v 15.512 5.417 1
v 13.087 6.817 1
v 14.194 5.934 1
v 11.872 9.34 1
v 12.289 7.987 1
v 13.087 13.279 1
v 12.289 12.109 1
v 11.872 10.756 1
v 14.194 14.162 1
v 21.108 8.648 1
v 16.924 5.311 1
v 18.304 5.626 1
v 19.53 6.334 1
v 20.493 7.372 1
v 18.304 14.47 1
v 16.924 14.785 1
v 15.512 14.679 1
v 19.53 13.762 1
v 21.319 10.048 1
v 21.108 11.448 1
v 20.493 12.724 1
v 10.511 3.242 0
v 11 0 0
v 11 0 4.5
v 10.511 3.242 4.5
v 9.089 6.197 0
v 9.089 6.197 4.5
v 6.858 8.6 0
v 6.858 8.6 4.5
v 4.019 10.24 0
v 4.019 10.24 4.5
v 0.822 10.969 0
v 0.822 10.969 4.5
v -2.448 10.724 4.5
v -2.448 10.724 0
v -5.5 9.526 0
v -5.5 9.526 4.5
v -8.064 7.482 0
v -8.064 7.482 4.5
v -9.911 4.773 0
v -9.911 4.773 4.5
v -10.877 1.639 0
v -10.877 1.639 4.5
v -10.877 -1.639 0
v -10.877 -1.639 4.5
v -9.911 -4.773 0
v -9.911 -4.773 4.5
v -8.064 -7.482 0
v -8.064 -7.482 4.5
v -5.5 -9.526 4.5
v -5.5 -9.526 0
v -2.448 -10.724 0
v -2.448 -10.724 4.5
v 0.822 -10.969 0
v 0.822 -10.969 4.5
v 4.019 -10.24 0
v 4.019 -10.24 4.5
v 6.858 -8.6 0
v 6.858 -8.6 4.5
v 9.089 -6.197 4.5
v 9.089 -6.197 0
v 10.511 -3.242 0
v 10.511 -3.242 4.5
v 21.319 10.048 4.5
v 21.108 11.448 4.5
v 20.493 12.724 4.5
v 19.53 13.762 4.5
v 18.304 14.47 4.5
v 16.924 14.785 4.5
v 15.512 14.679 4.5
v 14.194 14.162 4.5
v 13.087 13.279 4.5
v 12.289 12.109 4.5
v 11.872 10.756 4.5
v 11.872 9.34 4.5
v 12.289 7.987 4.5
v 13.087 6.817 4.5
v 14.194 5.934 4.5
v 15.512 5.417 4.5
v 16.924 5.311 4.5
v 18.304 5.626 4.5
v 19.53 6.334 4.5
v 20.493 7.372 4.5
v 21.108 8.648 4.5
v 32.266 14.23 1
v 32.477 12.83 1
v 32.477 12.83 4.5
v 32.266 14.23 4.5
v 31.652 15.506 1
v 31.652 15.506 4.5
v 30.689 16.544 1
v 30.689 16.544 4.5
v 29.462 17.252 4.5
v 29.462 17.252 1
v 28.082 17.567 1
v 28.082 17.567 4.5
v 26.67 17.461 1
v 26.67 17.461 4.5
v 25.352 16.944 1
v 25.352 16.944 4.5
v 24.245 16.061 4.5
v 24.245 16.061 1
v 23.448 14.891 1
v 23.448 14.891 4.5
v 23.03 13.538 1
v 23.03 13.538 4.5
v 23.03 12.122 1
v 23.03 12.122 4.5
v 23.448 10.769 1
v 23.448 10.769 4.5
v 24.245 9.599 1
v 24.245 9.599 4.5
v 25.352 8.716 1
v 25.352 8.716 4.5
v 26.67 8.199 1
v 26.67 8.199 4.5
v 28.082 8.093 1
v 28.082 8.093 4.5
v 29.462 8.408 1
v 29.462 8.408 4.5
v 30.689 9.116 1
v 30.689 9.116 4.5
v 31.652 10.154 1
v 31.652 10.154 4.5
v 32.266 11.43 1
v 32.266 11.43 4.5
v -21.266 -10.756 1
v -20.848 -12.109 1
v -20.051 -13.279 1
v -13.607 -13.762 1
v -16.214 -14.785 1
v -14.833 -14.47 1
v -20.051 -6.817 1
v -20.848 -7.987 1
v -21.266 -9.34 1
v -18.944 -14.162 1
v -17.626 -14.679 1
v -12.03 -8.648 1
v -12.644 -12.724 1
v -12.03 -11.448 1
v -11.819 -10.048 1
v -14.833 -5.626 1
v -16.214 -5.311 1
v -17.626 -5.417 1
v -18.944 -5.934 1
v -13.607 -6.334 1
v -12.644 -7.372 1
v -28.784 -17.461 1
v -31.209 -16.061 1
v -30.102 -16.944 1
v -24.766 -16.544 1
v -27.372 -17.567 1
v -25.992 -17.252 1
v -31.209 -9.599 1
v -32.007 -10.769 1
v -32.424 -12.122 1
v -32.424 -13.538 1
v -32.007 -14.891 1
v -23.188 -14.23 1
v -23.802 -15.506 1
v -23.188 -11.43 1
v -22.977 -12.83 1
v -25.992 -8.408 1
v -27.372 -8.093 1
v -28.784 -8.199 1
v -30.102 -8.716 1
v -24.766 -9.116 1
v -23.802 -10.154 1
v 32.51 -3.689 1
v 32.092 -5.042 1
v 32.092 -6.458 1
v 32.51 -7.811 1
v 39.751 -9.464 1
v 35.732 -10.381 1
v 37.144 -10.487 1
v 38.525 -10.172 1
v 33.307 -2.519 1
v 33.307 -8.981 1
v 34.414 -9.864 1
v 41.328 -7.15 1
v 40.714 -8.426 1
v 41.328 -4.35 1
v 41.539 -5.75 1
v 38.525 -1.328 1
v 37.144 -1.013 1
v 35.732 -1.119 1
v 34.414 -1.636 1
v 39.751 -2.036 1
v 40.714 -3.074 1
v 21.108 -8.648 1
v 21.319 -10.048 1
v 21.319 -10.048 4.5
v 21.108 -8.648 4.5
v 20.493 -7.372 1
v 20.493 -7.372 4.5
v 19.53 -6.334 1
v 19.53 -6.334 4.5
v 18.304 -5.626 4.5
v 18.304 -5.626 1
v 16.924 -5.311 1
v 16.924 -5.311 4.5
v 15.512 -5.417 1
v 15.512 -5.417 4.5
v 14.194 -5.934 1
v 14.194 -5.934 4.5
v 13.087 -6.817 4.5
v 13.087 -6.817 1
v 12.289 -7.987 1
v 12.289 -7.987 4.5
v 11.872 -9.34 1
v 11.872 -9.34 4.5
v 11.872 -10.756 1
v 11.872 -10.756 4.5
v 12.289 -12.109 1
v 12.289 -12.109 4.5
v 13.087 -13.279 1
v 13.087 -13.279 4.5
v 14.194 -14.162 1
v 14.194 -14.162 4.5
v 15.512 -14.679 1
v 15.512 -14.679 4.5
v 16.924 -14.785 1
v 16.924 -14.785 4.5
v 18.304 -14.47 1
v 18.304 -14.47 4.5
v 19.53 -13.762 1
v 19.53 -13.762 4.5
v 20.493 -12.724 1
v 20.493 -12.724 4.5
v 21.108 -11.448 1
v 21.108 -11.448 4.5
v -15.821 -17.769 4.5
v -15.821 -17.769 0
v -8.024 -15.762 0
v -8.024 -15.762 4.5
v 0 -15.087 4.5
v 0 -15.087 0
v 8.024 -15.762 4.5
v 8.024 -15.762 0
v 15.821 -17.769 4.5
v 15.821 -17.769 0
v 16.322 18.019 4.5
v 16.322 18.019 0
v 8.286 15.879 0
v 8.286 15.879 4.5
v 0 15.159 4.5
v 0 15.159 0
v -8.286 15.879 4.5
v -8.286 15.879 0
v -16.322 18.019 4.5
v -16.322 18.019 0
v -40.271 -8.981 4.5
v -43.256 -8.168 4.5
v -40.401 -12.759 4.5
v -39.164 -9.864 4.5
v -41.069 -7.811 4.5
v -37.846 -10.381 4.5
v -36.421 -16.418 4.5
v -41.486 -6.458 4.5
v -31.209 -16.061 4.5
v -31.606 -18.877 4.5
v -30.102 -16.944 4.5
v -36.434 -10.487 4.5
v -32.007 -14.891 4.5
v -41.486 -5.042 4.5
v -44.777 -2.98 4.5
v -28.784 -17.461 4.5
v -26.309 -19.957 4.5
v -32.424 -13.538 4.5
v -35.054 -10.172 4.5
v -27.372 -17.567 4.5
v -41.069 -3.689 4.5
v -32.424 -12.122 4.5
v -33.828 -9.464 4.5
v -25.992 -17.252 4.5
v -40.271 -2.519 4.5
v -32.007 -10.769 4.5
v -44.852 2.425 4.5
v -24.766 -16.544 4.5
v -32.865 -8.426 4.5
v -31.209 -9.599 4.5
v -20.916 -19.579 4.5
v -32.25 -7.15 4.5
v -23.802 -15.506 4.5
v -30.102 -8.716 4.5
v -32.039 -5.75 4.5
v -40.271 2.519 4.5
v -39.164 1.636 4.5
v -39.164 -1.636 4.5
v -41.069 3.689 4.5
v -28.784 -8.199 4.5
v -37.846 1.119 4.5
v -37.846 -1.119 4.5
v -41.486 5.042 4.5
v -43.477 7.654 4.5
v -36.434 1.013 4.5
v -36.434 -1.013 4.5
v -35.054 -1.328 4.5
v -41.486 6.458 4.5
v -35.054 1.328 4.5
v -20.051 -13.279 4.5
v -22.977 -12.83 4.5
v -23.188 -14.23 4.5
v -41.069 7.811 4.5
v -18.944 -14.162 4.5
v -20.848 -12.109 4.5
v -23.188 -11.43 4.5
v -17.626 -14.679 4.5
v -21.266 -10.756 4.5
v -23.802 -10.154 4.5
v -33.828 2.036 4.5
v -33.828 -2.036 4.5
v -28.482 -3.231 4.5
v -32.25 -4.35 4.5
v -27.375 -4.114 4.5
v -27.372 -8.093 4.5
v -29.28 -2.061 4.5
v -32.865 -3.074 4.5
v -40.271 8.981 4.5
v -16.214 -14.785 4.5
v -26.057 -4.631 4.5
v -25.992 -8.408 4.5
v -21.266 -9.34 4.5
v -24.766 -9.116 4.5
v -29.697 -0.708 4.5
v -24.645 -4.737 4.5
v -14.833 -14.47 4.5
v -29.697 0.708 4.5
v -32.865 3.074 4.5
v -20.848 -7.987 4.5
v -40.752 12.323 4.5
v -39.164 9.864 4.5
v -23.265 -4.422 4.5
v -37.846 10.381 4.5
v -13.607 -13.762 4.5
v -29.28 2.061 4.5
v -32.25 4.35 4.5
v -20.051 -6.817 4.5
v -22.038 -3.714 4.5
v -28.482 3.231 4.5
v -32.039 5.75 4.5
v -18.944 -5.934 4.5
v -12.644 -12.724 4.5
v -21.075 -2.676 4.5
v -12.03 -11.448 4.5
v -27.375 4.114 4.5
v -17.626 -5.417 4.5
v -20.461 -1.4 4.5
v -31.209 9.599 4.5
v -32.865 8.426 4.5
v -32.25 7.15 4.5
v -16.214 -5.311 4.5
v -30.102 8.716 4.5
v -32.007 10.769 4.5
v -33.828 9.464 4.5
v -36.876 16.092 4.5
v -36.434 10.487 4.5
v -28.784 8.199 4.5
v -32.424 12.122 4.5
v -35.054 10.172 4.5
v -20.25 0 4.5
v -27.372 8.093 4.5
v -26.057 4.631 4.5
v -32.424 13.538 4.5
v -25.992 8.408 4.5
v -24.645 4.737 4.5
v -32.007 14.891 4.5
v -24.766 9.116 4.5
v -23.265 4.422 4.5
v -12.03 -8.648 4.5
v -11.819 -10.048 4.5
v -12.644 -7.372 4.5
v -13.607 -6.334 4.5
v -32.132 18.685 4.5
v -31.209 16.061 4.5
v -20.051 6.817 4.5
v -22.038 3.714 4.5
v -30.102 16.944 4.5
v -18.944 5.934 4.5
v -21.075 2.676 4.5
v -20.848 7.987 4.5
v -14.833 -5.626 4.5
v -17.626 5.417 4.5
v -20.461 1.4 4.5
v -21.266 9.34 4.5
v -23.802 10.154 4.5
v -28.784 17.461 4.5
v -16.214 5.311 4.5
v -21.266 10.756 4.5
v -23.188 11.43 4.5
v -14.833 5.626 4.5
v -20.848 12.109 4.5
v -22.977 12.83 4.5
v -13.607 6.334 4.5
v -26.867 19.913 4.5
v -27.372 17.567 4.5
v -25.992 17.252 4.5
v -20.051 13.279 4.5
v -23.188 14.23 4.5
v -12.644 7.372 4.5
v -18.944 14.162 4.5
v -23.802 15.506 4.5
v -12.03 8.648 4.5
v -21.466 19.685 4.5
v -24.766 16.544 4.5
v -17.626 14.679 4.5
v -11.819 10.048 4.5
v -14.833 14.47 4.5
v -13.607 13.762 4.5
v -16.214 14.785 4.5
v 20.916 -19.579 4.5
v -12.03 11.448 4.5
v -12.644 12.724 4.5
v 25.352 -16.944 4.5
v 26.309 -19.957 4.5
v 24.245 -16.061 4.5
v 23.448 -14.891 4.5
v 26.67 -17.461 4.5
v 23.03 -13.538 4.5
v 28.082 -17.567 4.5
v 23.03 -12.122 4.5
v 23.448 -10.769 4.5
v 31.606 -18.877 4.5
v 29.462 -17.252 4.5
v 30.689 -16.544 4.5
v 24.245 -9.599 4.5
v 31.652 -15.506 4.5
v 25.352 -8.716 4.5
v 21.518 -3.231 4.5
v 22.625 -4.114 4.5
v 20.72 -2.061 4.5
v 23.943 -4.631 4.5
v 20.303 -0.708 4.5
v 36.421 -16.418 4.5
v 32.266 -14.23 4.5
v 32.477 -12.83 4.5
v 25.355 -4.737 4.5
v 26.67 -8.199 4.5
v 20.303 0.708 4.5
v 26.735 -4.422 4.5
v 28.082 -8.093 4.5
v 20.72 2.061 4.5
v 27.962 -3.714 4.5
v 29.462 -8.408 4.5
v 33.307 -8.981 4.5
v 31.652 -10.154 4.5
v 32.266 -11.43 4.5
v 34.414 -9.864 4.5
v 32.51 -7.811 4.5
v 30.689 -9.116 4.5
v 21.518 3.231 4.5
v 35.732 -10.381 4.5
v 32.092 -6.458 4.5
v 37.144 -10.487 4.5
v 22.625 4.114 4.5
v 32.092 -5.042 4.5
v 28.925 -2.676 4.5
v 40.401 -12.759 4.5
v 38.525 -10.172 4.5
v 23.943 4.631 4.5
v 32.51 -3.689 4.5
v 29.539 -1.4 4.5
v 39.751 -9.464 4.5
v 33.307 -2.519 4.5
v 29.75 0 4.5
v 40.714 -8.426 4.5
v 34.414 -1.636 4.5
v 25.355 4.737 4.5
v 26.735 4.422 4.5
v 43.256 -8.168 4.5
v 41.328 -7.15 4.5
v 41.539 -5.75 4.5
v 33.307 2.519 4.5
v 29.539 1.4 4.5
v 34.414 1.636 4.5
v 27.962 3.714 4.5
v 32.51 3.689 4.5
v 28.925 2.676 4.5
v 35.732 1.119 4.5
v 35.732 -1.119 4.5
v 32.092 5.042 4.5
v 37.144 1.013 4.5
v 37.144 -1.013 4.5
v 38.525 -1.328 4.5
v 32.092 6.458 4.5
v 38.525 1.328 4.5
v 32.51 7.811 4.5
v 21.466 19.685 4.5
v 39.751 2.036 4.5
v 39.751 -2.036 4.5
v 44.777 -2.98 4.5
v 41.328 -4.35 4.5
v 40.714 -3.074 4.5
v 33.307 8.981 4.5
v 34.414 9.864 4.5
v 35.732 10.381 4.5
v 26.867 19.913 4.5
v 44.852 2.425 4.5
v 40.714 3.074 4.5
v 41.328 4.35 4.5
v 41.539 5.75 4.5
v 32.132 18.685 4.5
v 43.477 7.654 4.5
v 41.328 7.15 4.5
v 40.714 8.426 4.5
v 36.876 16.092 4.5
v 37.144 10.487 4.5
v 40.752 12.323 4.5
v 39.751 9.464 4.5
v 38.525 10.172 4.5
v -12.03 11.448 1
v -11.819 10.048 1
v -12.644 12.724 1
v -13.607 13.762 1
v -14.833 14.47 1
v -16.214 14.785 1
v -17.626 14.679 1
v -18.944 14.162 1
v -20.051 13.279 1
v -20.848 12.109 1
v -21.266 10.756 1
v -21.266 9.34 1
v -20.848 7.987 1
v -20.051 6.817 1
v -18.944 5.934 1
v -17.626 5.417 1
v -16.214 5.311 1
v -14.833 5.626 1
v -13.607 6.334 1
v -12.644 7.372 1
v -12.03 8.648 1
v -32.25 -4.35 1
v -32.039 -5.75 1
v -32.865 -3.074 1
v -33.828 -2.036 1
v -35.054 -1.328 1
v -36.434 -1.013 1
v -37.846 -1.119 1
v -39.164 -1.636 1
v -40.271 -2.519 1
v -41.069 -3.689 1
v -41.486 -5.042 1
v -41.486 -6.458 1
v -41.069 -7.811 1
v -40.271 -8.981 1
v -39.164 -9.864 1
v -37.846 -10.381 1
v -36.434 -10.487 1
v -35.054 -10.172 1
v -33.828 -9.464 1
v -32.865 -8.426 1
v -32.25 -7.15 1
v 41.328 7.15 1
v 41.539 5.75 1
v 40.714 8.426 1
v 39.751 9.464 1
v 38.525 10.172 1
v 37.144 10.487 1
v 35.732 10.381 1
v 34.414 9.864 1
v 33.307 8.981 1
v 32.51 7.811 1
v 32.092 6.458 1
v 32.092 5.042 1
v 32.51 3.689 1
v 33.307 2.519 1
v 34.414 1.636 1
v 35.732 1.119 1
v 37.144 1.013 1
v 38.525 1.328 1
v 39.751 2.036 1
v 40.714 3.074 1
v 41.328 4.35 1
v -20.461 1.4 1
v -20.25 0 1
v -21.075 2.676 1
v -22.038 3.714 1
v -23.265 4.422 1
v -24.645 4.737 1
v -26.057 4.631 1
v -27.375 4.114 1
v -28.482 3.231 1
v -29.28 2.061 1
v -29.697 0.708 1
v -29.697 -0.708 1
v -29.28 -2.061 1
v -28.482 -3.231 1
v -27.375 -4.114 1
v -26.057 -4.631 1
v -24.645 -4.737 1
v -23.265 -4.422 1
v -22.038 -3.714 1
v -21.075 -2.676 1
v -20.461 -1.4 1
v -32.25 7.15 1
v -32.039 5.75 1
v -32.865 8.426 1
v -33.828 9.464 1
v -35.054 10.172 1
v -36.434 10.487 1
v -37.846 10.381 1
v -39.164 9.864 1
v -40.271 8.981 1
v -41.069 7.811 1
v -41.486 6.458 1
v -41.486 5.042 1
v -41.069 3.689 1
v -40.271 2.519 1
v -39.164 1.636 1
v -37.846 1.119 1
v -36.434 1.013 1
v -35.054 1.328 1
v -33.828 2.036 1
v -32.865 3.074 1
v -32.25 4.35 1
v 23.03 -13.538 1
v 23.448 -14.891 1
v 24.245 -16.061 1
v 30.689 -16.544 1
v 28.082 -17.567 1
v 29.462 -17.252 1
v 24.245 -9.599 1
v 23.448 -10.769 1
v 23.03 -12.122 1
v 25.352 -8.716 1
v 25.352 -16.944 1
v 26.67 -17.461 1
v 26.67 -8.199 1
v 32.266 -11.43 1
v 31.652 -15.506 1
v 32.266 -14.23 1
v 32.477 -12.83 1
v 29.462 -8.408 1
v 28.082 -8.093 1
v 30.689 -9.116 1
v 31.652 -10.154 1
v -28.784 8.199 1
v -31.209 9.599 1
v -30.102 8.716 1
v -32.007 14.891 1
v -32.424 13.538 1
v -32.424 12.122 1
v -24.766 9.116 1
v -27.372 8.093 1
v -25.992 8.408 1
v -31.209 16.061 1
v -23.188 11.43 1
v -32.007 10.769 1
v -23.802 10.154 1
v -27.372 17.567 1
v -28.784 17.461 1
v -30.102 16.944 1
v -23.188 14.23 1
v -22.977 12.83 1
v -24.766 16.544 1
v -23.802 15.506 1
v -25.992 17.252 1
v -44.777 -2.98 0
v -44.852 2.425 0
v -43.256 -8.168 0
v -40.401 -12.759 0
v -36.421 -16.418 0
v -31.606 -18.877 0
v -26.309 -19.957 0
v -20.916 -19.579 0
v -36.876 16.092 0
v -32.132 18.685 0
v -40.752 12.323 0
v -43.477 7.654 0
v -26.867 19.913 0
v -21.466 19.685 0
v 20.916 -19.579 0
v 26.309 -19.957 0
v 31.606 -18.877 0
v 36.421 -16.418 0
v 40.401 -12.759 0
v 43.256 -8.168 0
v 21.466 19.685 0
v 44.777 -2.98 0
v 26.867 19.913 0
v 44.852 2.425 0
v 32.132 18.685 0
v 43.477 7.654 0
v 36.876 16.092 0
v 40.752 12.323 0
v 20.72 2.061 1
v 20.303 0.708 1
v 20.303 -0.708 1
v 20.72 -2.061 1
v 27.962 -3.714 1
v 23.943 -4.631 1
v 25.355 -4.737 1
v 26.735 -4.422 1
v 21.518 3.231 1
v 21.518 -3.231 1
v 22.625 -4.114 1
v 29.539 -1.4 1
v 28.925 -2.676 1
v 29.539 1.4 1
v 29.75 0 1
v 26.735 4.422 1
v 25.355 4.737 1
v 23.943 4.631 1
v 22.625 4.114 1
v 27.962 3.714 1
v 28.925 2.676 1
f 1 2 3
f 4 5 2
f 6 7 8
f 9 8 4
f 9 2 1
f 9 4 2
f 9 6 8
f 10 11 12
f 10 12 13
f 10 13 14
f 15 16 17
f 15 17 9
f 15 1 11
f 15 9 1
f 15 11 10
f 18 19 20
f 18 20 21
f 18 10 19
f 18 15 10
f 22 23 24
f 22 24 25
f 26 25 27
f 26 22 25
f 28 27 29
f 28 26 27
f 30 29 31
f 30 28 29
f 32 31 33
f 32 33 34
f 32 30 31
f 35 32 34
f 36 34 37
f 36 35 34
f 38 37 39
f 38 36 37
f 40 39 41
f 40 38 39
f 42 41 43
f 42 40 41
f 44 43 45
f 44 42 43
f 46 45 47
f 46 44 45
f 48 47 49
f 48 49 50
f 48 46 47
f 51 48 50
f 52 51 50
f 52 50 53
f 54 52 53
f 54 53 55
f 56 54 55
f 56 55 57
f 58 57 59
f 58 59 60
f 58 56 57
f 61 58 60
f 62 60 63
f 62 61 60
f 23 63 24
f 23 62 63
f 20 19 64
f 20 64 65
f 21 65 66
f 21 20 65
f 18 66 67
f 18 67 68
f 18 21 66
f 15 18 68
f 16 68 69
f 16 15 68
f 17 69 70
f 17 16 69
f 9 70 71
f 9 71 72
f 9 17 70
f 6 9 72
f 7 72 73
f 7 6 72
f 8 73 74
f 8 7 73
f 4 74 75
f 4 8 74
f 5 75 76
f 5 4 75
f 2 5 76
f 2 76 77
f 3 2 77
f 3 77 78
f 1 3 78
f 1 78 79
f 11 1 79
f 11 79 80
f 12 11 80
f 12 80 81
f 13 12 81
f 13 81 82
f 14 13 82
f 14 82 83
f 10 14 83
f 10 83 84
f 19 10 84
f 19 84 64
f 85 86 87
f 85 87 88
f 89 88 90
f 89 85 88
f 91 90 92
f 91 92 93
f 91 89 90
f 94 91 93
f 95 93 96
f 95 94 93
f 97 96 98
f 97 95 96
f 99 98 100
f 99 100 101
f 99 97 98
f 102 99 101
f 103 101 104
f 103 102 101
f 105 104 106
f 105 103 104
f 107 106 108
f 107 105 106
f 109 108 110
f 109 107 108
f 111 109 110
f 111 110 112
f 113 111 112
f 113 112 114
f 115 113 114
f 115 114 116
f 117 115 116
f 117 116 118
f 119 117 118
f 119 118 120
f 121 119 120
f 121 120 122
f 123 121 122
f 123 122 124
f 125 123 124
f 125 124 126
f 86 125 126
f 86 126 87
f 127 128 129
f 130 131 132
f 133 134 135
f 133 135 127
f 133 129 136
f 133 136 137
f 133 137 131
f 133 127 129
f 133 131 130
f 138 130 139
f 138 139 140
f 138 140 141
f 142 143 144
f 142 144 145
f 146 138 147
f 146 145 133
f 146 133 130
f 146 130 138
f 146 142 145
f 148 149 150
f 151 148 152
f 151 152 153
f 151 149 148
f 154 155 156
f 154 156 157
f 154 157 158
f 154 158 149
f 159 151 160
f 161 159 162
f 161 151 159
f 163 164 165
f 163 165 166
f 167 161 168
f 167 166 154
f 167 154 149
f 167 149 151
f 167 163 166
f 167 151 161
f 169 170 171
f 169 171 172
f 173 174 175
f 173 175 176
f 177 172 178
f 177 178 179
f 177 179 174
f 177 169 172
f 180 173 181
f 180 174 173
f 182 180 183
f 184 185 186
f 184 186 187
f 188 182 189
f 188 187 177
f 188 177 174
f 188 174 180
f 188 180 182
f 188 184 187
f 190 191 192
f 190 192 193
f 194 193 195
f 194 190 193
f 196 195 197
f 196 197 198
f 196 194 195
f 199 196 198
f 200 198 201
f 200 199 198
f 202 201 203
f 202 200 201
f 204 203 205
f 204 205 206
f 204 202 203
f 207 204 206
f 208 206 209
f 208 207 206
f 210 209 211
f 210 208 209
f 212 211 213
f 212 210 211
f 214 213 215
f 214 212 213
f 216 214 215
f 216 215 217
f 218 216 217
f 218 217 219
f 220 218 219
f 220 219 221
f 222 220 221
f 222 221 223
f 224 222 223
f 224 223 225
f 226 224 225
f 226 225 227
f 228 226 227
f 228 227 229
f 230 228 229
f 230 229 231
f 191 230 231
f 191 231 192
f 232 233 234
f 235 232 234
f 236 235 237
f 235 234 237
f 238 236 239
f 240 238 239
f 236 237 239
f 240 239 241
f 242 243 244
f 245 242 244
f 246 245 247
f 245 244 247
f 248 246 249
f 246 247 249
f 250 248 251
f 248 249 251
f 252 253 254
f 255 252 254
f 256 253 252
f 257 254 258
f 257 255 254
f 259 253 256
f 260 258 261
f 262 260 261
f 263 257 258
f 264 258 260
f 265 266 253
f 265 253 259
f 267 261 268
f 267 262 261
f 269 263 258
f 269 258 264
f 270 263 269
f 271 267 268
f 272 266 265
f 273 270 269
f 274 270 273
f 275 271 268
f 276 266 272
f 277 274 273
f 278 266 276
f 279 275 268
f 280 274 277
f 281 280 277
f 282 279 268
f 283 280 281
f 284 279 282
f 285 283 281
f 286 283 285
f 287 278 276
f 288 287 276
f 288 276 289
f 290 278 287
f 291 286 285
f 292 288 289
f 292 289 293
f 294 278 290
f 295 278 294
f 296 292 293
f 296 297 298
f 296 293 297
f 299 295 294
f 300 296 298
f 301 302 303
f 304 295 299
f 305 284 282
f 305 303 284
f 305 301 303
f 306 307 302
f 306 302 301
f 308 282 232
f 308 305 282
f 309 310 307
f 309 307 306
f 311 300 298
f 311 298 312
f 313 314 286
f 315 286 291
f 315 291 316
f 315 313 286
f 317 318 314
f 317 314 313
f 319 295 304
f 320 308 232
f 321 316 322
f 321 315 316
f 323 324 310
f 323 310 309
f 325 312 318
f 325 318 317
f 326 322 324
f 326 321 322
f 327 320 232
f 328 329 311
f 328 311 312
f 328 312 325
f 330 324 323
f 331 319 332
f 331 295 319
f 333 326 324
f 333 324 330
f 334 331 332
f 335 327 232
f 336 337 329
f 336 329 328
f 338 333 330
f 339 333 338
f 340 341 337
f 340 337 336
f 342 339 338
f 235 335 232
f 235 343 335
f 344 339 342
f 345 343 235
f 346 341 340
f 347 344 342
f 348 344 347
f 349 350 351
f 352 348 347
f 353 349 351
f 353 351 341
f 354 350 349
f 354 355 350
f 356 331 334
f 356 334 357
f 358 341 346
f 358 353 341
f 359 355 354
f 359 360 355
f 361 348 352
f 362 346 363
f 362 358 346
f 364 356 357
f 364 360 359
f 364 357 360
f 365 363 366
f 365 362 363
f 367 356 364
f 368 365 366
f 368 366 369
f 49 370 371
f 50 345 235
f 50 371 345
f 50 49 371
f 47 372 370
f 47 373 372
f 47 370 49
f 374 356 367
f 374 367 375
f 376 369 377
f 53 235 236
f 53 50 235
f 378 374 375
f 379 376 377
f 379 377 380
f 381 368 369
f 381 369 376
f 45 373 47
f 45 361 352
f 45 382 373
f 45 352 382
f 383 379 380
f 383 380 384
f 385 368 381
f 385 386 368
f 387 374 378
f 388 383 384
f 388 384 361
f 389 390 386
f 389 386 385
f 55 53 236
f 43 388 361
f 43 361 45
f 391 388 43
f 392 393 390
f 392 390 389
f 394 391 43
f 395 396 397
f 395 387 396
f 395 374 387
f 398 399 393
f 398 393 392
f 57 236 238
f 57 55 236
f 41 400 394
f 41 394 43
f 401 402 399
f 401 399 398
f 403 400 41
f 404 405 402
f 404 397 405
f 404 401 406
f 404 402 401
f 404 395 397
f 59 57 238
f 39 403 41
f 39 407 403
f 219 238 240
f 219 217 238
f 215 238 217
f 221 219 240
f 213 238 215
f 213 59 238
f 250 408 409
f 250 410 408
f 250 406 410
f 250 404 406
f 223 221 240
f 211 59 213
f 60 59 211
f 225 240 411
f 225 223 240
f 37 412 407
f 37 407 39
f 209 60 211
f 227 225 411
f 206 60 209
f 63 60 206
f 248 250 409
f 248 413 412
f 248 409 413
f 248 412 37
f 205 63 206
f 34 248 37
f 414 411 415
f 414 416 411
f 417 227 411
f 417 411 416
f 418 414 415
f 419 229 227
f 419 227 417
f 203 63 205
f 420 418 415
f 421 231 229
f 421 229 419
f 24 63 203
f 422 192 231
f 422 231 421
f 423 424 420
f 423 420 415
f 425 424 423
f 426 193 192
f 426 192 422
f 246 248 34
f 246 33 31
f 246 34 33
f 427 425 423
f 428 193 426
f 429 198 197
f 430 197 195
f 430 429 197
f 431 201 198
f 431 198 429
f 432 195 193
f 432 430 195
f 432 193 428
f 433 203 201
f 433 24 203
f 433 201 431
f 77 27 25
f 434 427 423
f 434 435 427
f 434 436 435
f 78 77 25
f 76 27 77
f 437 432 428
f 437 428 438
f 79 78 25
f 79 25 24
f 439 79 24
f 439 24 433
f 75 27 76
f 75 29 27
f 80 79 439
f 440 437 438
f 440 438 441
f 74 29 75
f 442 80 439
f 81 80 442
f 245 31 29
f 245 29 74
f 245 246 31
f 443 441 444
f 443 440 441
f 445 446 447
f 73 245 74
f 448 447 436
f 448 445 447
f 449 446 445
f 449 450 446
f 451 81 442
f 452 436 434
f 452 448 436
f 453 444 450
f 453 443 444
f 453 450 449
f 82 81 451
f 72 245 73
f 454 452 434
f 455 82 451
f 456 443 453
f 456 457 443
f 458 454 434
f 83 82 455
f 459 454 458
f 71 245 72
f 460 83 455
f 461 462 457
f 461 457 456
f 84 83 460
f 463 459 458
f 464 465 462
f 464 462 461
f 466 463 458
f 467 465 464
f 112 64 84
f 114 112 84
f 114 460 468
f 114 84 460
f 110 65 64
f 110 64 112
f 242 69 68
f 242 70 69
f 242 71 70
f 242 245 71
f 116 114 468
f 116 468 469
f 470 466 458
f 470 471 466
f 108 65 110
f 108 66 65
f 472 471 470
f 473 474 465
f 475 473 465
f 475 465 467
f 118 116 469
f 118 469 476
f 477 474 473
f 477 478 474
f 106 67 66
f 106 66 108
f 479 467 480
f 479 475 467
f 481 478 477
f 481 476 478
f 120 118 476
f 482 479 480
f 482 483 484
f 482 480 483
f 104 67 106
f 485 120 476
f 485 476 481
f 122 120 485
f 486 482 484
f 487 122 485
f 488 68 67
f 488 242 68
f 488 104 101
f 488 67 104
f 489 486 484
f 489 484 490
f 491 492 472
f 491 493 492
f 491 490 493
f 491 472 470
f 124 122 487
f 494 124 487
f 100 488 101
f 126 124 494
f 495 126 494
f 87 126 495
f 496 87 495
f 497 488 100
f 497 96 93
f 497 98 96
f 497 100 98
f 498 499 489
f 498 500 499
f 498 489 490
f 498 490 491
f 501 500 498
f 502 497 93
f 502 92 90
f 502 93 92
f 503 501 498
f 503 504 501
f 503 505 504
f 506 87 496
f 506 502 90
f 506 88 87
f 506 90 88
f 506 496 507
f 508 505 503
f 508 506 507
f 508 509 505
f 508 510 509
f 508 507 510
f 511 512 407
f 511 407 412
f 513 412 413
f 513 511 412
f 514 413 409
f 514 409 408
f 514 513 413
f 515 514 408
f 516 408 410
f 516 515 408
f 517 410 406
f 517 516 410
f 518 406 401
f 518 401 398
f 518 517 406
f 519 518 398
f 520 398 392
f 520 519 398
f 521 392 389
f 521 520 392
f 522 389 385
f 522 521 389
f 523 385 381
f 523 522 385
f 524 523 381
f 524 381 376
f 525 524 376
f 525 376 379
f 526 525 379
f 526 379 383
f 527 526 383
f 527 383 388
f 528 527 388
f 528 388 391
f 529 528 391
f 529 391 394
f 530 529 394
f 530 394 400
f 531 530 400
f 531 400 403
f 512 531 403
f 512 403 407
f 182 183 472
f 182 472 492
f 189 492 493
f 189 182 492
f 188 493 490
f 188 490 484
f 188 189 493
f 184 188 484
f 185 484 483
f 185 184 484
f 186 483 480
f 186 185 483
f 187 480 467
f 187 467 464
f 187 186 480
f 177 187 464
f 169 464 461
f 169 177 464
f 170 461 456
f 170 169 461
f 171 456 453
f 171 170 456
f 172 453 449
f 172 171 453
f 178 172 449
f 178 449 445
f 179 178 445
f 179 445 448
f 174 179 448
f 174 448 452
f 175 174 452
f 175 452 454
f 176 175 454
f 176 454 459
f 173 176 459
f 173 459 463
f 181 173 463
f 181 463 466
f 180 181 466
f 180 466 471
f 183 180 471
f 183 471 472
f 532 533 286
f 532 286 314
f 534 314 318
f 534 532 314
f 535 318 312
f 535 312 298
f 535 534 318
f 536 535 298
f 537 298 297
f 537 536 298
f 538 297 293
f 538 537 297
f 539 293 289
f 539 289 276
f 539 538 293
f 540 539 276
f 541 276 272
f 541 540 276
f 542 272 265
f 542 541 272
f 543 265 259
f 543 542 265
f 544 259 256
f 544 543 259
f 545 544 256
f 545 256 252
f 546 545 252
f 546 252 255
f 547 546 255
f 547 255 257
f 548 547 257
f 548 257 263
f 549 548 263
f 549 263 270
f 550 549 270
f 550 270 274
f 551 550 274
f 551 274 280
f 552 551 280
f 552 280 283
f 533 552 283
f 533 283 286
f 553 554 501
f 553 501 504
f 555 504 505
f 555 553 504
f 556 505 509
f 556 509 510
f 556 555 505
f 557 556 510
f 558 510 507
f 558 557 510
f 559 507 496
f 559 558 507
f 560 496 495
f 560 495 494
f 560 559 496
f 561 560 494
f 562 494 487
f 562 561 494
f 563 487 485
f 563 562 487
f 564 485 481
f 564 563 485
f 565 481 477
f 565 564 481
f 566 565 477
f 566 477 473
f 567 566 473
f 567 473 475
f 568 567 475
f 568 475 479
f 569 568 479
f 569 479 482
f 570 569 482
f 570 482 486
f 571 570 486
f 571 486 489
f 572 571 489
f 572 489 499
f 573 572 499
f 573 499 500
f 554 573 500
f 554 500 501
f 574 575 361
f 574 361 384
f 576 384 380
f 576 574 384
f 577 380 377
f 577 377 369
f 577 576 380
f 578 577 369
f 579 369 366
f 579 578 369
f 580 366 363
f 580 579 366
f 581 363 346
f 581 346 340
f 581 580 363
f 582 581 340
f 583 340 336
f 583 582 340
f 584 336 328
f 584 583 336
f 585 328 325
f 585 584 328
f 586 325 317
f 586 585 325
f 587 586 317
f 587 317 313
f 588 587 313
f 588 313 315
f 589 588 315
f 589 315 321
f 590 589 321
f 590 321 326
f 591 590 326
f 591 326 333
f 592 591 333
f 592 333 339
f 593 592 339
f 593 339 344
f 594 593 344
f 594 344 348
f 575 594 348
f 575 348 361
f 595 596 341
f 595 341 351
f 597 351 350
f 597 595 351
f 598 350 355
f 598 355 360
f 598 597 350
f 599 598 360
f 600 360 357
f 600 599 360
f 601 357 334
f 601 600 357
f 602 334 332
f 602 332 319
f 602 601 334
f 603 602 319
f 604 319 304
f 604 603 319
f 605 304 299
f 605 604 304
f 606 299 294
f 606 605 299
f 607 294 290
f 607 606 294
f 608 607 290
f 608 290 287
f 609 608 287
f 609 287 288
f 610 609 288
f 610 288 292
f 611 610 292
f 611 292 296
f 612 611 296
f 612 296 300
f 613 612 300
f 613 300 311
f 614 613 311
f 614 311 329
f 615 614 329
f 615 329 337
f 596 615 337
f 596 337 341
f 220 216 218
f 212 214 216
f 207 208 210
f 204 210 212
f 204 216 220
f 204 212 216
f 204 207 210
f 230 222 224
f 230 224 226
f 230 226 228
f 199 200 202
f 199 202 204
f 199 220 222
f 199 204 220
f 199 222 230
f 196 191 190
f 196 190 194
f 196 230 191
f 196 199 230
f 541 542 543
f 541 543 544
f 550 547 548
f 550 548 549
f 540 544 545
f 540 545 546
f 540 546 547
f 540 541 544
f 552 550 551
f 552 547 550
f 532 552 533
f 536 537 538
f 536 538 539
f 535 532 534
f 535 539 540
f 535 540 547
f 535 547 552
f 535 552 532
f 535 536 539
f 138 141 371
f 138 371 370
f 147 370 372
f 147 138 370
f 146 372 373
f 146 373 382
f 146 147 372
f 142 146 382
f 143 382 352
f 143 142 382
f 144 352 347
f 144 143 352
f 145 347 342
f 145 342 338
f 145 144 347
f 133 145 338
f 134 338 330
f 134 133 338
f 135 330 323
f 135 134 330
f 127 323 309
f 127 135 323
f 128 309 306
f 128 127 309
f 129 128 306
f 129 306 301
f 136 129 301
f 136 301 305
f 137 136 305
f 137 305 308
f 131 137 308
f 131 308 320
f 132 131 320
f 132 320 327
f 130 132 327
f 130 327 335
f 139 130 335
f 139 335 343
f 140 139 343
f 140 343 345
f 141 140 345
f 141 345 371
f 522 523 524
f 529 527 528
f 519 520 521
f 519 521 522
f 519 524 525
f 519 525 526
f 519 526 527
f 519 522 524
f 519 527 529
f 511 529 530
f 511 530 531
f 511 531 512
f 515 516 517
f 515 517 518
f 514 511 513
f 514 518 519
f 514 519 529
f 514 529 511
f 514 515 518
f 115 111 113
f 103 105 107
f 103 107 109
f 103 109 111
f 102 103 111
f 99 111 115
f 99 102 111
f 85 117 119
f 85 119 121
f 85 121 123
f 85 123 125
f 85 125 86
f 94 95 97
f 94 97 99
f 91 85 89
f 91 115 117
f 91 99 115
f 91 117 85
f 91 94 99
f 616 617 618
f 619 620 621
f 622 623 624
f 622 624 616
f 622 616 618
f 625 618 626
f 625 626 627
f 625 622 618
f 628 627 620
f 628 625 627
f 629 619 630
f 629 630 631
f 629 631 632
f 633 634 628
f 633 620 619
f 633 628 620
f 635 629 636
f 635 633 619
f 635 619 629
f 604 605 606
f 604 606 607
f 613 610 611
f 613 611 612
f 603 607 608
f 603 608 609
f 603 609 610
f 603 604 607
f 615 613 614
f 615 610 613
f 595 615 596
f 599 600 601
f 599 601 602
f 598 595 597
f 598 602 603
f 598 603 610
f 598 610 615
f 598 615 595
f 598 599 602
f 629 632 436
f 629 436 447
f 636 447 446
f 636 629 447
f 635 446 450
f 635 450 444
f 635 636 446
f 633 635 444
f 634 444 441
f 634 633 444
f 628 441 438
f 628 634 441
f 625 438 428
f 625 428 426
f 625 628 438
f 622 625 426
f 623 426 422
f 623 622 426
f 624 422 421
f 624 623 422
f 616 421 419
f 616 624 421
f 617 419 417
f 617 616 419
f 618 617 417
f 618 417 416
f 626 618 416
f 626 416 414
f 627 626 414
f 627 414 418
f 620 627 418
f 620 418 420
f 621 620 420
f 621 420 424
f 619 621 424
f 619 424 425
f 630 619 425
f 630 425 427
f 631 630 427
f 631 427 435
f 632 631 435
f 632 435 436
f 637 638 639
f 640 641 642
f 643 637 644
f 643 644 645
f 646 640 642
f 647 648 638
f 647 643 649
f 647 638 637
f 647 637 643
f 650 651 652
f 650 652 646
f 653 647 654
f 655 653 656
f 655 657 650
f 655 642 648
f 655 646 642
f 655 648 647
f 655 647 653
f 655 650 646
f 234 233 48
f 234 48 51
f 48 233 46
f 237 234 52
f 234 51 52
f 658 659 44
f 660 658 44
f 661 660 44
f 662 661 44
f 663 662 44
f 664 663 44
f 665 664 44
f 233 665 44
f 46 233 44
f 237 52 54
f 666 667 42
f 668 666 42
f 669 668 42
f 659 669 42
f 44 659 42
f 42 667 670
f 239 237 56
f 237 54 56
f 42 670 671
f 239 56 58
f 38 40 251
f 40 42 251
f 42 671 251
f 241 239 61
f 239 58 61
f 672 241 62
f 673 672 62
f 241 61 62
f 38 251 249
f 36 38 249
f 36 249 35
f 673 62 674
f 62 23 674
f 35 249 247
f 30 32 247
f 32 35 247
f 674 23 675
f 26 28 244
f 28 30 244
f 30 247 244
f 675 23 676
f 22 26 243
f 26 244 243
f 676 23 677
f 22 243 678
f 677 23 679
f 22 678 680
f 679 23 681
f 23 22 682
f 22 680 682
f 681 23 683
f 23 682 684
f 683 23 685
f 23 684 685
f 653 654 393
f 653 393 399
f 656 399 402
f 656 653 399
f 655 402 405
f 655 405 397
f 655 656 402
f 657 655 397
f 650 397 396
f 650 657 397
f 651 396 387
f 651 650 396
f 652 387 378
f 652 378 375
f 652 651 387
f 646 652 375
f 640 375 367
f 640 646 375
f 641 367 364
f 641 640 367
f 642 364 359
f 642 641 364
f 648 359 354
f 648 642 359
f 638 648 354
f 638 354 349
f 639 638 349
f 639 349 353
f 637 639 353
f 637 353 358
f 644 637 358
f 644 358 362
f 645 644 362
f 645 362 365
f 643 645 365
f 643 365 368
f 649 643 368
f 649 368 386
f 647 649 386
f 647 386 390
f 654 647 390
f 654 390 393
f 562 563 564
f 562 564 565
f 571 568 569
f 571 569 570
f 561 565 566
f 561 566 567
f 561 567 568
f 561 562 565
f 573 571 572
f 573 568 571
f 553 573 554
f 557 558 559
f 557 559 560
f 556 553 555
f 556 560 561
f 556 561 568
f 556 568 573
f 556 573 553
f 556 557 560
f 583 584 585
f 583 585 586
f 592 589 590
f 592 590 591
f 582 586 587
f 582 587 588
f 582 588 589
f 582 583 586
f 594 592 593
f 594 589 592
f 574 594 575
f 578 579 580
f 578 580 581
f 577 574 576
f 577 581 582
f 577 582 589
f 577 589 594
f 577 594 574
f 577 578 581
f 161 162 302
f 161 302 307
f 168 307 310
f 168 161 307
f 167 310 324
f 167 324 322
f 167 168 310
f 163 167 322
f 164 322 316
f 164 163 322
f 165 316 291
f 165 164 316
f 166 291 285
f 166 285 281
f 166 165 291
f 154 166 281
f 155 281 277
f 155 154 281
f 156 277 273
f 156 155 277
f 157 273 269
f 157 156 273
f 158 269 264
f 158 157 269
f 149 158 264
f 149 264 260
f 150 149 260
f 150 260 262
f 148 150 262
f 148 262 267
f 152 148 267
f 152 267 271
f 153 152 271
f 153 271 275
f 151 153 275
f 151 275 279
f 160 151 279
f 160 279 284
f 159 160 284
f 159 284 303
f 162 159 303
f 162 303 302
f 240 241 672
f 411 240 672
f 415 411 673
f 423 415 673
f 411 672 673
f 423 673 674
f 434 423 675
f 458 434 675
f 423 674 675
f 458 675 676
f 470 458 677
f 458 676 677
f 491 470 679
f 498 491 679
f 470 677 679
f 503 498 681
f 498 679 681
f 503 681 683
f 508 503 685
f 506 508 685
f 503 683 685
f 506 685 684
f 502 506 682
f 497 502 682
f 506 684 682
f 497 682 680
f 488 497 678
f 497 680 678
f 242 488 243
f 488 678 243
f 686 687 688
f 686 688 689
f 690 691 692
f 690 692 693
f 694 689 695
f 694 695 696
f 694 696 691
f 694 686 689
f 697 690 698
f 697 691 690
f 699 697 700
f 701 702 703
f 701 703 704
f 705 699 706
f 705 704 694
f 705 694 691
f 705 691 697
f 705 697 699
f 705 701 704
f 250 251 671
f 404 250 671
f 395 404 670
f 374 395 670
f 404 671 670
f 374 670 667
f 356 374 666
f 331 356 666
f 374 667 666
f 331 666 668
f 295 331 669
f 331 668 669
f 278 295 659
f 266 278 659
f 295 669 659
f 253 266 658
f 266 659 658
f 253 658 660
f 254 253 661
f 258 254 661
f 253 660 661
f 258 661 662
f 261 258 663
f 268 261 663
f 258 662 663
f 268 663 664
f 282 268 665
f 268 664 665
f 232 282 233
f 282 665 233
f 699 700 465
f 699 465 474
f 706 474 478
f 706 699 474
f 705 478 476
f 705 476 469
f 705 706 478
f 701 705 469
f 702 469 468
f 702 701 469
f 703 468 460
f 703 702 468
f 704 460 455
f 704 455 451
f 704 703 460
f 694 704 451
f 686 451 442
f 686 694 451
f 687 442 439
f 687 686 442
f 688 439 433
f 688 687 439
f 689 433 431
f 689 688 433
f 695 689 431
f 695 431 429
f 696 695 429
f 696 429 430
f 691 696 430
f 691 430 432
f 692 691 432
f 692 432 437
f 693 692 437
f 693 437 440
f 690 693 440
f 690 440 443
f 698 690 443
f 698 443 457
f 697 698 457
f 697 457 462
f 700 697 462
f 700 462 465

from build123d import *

# Parameters (mm, degrees)
F0_R     = 4.75
F0_R_2   = 11
F1_DEPTH = 4.5
F2_DEPTH = 1


# Not quite as in the source:
# - a feature names something its author has since deleted; it is built from what else it names


with BuildPart() as f1:
    # F0 (on Top) → F1 (new body)
    with BuildSketch(Plane.XY):
        with BuildLine():
            ThreePointArc((-15.8212677669, -17.7693802535), (0, -15.0870091218), (15.8212677669, -17.7693802535))
            ThreePointArc((15.8212677669, -17.7693802535), (44.9980398453, -0.2800041916), (16.3223672692, 18.019397609))
            ThreePointArc((16.3223672692, 18.019397609), (0, 15.1589625906), (-16.3223672692, 18.019397609))
            ThreePointArc((-16.3223672692, 18.019397609), (-44.9980398453, -0.2800041916), (-15.8212677669, -17.7693802535))
        make_face()
        with Locations((-27.7271234226, -12.8301069662)):
            Circle(F0_R, mode=Mode.SUBTRACT)
        with Locations((-16.5687225704, -10.0480051668)):
            Circle(F0_R, mode=Mode.SUBTRACT)
        with Locations((-36.7892470891, -5.75)):
            Circle(F0_R, mode=Mode.SUBTRACT)
        with Locations((16.5687225704, -10.0480051668)):
            Circle(F0_R, mode=Mode.SUBTRACT)
        with Locations((27.7271234226, -12.8301069662)):
            Circle(F0_R, mode=Mode.SUBTRACT)
        with Locations((36.7892470891, -5.75)):
            Circle(F0_R, mode=Mode.SUBTRACT)
        with Locations((-25, 0)):
            Circle(F0_R, mode=Mode.SUBTRACT)
        with Locations((-36.7892470891, 5.75)):
            Circle(F0_R, mode=Mode.SUBTRACT)
        with Locations((-27.7271234226, 12.8301069662)):
            Circle(F0_R, mode=Mode.SUBTRACT)
        with Locations((-16.5687225704, 10.0480051668)):
            Circle(F0_R, mode=Mode.SUBTRACT)
        Circle(F0_R_2, mode=Mode.SUBTRACT)
        with Locations((25, 0)):
            Circle(F0_R, mode=Mode.SUBTRACT)
        with Locations((36.7892470891, 5.75)):
            Circle(F0_R, mode=Mode.SUBTRACT)
        with Locations((16.5687225704, 10.0480051668)):
            Circle(F0_R, mode=Mode.SUBTRACT)
        with Locations((27.7271234226, 12.8301069662)):
            Circle(F0_R, mode=Mode.SUBTRACT)
    extrude(amount=F1_DEPTH)

    # F0 (on Top) → F2 (join)
    with BuildSketch(Plane.XY):
        with Locations((-25, 0)):
            Circle(F0_R)
        with Locations((25, 0)):
            Circle(F0_R)
        with Locations((-16.5687225704, 10.0480051668)):
            Circle(F0_R)
        with Locations((-27.7271234226, 12.8301069662)):
            Circle(F0_R)
        with Locations((-36.7892470891, 5.75)):
            Circle(F0_R)
        with Locations((-36.7892470891, -5.75)):
            Circle(F0_R)
        with Locations((-27.7271234226, -12.8301069662)):
            Circle(F0_R)
        with Locations((-16.5687225704, -10.0480051668)):
            Circle(F0_R)
        with Locations((16.5687225704, 10.0480051668)):
            Circle(F0_R)
        with Locations((27.7271234226, 12.8301069662)):
            Circle(F0_R)
        with Locations((36.7892470891, 5.75)):
            Circle(F0_R)
        with Locations((36.7892470891, -5.75)):
            Circle(F0_R)
        with Locations((27.7271234226, -12.8301069662)):
            Circle(F0_R)
        with Locations((16.5687225704, -10.0480051668)):
            Circle(F0_R)
    extrude(amount=F2_DEPTH)


solid = f1.part
